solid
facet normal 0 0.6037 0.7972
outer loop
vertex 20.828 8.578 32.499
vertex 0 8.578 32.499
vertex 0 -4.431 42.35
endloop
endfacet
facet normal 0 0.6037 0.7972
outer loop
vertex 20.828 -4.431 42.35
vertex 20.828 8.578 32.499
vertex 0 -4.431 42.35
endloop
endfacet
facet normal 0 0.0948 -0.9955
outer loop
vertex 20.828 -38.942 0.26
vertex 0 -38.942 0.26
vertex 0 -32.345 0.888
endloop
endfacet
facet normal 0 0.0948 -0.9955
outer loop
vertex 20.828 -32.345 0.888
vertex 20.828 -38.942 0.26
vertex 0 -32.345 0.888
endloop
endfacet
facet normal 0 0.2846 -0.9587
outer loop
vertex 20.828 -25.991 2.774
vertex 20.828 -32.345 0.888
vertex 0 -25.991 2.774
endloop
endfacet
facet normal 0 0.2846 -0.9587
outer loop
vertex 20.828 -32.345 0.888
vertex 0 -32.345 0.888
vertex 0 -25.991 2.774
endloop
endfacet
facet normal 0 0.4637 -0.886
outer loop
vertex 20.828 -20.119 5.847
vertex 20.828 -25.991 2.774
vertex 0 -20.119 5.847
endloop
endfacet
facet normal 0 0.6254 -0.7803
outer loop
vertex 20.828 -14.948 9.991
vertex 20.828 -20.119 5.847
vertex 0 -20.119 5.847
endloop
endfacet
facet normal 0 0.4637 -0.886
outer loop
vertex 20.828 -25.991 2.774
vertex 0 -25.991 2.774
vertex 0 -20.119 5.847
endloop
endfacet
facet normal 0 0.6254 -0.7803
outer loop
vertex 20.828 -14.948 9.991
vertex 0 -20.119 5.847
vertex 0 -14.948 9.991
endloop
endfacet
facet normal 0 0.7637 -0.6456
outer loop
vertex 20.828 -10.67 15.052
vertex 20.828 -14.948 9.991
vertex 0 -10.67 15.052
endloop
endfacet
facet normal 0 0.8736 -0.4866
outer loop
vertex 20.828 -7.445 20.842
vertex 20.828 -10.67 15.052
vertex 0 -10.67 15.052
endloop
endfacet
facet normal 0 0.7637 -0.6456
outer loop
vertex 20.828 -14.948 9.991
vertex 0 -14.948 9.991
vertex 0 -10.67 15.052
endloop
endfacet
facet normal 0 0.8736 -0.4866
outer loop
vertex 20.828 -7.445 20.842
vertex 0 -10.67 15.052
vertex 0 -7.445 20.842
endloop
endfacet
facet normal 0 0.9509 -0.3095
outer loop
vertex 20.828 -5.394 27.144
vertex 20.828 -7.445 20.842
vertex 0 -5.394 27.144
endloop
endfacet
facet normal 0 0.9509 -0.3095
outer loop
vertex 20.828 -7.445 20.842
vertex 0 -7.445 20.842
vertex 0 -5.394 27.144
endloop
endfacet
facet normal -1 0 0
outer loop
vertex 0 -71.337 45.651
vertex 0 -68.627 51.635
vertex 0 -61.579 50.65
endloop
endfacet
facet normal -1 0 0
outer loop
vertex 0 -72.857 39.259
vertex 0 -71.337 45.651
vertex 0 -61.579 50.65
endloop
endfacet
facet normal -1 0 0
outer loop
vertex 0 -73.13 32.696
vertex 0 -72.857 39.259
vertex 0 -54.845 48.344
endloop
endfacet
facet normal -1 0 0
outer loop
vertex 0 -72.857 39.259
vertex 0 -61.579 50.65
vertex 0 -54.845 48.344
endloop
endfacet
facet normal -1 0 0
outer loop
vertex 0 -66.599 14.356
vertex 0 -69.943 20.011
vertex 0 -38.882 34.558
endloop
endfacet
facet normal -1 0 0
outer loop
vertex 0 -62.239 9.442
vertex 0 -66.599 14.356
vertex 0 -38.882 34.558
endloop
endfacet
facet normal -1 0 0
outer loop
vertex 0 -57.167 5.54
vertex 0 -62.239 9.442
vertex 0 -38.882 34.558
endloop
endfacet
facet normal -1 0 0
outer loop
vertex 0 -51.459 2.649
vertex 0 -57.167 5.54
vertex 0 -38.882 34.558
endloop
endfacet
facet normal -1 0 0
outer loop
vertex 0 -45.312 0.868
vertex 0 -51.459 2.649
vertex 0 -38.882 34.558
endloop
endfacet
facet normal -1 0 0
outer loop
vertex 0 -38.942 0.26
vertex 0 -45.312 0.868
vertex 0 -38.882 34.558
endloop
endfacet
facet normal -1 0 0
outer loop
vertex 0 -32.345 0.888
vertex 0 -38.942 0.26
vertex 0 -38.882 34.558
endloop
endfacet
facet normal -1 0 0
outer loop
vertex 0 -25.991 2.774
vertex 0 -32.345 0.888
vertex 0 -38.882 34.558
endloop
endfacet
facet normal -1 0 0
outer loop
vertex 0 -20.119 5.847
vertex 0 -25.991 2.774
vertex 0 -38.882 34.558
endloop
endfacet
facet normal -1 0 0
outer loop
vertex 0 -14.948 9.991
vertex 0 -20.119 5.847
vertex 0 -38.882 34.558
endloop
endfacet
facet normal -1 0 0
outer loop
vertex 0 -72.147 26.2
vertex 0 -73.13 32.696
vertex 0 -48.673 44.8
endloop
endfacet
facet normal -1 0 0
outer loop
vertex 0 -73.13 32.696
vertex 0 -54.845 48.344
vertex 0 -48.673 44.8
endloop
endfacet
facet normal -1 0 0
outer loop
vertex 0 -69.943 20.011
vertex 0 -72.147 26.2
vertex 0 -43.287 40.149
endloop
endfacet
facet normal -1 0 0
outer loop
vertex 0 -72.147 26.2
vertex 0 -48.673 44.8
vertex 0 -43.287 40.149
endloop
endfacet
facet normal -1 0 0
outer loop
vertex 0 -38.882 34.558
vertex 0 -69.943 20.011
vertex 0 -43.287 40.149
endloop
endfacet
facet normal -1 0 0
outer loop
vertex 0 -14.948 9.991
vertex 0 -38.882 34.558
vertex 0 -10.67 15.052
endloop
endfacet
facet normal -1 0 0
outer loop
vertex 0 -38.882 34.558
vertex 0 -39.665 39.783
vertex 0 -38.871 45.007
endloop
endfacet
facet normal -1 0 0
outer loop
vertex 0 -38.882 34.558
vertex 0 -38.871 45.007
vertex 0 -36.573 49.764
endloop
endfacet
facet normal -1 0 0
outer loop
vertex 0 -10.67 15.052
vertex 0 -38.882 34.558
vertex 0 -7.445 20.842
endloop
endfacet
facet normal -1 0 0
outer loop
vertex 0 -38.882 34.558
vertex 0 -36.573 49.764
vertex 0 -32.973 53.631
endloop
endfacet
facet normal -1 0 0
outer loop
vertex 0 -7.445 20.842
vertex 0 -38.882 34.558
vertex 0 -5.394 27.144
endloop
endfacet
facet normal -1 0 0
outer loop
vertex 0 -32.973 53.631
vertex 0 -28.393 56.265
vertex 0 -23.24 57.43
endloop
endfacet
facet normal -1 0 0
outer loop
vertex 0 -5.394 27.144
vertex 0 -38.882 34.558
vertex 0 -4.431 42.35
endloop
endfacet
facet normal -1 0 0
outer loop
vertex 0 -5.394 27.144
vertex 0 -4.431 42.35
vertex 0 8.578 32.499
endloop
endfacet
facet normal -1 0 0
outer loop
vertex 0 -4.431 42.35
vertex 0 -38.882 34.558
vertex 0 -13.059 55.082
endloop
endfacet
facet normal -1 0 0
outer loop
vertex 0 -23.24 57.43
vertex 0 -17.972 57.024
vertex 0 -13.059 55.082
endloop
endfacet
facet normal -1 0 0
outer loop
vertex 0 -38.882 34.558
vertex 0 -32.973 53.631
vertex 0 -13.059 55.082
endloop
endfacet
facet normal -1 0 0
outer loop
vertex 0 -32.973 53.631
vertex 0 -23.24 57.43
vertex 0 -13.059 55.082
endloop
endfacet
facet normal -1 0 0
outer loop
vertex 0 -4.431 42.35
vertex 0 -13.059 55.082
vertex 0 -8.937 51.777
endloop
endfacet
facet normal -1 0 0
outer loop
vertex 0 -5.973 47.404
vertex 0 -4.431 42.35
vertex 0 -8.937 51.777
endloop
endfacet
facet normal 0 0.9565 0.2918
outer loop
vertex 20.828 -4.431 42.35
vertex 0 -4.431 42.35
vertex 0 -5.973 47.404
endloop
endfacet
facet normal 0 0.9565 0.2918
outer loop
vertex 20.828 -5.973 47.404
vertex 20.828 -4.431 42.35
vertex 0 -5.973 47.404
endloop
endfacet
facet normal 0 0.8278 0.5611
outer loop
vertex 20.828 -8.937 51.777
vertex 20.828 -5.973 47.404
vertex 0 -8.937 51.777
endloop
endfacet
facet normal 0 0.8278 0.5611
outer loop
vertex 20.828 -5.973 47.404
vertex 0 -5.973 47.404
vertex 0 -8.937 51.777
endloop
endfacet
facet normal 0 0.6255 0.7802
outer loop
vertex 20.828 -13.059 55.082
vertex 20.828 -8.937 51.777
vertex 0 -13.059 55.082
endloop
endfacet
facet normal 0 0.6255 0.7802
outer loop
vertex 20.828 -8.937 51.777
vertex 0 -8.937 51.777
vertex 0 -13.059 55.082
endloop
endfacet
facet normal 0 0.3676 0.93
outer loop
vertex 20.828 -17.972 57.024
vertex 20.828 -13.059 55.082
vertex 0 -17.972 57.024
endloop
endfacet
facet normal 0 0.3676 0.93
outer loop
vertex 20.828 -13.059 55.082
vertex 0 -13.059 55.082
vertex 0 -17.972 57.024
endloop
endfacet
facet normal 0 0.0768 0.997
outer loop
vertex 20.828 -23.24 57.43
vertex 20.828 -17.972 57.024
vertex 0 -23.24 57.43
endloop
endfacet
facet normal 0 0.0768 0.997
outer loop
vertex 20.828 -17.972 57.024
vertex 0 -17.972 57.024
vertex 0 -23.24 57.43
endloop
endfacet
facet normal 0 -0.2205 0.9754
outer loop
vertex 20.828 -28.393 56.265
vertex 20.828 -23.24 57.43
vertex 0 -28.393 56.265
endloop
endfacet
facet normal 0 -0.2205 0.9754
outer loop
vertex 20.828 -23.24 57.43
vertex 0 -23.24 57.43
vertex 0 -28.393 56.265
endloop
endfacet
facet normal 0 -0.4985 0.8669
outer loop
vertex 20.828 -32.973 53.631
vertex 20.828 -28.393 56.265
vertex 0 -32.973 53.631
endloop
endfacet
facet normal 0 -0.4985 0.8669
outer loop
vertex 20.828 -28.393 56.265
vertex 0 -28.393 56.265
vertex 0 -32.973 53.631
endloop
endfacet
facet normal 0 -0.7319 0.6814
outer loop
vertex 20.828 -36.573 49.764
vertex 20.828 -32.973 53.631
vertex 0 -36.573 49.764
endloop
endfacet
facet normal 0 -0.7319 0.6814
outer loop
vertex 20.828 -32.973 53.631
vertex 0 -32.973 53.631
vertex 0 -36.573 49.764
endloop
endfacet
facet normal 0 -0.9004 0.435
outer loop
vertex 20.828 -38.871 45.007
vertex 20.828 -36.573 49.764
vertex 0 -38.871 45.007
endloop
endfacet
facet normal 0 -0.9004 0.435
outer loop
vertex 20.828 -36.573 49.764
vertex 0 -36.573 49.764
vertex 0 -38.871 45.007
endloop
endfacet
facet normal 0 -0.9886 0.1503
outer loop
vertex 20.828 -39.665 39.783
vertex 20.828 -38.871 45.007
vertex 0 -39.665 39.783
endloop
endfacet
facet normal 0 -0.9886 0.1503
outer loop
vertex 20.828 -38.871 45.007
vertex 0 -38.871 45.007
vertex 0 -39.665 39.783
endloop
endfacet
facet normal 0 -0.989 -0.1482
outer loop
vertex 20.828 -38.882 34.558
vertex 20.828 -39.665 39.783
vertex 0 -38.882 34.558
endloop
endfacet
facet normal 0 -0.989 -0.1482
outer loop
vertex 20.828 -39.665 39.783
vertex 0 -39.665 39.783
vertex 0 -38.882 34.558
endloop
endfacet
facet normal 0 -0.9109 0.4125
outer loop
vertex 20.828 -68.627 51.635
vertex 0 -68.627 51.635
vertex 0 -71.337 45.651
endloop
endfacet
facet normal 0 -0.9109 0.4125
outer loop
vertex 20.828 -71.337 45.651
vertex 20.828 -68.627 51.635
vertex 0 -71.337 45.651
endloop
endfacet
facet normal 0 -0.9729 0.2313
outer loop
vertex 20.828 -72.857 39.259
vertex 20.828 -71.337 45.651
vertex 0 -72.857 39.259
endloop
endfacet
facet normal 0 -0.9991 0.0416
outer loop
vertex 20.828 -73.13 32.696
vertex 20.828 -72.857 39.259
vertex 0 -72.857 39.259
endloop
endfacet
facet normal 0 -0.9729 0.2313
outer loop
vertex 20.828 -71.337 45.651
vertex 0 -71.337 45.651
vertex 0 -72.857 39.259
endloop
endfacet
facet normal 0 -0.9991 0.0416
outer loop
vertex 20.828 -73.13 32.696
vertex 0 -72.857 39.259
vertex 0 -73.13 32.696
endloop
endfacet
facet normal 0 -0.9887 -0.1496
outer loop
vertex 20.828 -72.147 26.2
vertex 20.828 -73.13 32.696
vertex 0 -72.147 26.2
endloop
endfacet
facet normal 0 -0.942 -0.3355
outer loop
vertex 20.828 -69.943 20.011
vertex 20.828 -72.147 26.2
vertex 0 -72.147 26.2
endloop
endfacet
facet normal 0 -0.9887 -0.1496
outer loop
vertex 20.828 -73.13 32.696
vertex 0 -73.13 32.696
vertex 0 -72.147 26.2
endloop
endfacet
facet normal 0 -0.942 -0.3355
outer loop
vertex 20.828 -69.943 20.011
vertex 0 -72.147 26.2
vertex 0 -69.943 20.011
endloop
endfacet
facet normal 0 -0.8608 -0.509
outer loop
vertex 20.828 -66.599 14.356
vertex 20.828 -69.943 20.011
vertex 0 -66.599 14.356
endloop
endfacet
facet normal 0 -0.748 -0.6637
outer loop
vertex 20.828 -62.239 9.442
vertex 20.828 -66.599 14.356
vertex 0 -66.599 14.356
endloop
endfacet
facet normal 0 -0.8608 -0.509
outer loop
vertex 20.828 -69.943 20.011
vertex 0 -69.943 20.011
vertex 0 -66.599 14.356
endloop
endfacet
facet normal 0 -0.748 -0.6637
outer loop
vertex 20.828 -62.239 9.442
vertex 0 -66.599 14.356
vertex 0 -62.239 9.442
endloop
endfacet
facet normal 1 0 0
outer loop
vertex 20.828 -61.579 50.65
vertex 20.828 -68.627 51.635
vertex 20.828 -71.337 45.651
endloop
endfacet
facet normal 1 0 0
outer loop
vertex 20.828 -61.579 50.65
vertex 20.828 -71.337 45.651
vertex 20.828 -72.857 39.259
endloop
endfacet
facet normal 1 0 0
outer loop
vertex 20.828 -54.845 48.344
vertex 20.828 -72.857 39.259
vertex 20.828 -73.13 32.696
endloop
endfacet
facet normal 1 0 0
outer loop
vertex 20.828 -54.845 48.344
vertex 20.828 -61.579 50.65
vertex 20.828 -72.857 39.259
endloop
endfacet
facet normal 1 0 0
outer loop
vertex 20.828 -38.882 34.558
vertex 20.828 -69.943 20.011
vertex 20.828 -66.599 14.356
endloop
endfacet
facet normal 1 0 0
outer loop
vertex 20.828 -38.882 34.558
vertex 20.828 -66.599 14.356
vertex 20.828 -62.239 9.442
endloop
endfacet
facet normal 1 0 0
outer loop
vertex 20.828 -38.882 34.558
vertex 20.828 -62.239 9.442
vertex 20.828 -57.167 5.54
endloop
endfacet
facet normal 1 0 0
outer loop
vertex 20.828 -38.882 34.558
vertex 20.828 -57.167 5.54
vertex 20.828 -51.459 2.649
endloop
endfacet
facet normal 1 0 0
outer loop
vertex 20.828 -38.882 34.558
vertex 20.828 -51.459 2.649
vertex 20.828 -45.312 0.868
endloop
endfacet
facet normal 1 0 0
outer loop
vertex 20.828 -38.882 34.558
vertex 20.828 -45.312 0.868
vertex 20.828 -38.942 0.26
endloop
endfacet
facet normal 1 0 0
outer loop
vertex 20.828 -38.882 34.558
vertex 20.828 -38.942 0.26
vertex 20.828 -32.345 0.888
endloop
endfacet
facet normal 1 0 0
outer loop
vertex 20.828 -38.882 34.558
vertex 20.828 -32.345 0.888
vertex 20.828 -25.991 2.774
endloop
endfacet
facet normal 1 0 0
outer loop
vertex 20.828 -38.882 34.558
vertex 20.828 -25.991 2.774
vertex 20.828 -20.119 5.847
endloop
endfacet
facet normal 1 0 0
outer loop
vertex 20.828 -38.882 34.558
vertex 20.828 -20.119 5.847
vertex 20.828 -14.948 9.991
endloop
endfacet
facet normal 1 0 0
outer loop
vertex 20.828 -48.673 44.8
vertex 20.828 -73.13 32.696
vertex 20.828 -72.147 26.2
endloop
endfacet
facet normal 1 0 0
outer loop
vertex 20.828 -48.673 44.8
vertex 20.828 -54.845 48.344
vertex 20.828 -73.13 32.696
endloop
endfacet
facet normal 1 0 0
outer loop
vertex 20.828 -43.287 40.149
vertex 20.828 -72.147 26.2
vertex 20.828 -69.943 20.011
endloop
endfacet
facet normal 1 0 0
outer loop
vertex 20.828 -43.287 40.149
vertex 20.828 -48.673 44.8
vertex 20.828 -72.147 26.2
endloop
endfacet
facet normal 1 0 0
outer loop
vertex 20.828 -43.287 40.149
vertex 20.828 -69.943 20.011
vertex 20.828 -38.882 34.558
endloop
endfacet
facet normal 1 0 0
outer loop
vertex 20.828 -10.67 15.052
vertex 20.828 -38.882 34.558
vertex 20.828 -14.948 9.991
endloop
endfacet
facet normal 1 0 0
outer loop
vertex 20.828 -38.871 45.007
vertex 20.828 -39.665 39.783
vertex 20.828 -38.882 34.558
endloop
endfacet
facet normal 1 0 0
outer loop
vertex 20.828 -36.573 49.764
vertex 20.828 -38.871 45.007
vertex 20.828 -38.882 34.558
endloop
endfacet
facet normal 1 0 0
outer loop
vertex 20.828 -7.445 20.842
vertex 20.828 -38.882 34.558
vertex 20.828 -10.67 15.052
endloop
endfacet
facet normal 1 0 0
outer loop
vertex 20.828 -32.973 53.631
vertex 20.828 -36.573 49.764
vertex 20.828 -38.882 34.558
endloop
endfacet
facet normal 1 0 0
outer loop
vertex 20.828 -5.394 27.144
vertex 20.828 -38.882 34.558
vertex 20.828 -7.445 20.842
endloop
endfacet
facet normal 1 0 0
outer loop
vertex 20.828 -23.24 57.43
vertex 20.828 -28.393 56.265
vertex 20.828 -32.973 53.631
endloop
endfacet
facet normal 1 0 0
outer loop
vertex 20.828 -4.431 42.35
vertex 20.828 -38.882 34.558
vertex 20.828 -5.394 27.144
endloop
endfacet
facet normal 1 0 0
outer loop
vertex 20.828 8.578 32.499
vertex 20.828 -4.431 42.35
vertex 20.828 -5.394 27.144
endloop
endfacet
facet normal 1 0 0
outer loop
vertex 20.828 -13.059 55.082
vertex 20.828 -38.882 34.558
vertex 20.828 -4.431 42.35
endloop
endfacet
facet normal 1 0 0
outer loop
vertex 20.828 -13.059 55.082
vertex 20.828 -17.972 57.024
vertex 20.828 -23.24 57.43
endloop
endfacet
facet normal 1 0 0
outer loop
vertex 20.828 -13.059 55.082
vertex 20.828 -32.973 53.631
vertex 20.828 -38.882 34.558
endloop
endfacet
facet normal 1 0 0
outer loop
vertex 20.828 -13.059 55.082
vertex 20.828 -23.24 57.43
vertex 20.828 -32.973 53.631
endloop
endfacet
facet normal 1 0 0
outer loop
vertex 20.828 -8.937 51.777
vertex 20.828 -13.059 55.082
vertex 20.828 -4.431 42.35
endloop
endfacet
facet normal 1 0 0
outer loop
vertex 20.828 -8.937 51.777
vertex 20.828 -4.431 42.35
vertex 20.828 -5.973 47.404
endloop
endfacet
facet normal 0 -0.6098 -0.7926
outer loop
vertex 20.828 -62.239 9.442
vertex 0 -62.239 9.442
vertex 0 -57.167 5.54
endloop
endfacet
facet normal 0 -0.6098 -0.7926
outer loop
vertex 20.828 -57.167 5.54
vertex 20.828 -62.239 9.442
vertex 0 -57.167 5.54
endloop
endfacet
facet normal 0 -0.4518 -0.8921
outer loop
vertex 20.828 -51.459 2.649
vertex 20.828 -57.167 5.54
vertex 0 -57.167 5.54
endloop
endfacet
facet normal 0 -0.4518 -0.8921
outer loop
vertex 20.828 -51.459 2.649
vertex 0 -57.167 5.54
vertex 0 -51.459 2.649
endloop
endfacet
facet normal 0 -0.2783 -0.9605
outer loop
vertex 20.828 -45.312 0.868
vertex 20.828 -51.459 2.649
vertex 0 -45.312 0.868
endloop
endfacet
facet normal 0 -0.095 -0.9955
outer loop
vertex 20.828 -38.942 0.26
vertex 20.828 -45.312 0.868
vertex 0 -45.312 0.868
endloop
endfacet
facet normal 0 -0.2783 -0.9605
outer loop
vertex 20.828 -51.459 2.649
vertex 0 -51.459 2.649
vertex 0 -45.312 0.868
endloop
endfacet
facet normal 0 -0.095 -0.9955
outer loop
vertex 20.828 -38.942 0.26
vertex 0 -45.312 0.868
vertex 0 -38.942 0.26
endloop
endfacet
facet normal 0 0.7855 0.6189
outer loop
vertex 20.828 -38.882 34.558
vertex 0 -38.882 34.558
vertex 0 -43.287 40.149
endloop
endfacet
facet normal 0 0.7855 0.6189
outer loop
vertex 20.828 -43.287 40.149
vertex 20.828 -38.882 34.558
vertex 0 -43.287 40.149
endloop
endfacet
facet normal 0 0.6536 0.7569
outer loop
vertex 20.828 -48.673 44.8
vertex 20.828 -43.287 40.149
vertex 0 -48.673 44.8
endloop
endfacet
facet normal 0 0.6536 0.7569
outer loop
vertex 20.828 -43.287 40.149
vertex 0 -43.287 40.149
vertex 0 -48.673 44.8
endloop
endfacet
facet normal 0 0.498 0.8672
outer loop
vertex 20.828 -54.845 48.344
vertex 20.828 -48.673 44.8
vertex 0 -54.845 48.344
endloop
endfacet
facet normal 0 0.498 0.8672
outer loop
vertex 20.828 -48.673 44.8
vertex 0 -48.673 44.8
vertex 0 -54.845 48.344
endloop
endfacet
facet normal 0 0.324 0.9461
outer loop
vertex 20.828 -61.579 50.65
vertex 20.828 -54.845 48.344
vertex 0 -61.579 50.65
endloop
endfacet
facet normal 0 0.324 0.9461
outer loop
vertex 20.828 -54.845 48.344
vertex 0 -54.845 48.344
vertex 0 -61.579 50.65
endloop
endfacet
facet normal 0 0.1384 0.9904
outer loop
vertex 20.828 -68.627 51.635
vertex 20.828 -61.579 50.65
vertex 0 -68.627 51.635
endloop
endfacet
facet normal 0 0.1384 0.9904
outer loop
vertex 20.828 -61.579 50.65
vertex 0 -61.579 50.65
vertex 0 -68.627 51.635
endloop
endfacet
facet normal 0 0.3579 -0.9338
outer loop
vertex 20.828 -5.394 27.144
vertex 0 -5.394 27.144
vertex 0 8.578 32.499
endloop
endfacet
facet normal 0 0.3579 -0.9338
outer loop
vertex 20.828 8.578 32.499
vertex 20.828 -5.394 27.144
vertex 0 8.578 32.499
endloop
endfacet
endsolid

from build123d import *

# Parameters (mm, degrees)
F1_DEPTH = 20.828


with BuildPart() as f1:
    # F0 (on Right) → F1 (new body)
    with BuildSketch(Plane.YZ):
        with BuildLine():
            ThreePointArc((-38.881893, 34.558385), (-51.67462, 46.719688), (-68.627134, 51.635321))
            ThreePointArc((-68.627134, 51.635321), (-72.794153, 29.42421), (-62.239232, 9.441939))
            ThreePointArc((-62.239232, 9.441939), (-51.458628, 2.648717), (-38.942158, 0.259733))
            ThreePointArc((-38.942158, 0.259733), (-17.433325, 7.793481), (-5.394147, 27.144075))
            ThreePointArc((-5.394147, 27.144075), (-4.710099, 31.61057), (-4.619133, 36.128227))
            ThreePointArc((-4.619133, 36.128227), (-4.249669, 39.230896), (-4.431179, 42.350209))
            ThreePointArc((-4.431179, 42.350209), (-25.860322, 57.040886), (-38.881893, 34.558385))
        make_face()
        with BuildLine():
            Line((8.578393, 32.498907), (-4.431179, 42.350209))
            ThreePointArc((-4.431179, 42.350209), (-4.249669, 39.230896), (-4.619133, 36.128227))
            ThreePointArc((-4.619133, 36.128227), (-4.710099, 31.61057), (-5.394147, 27.144075))
            Line((-5.394147, 27.144075), (8.578393, 32.498907))
        make_face()
    extrude(amount=F1_DEPTH)


solid = f1.part
